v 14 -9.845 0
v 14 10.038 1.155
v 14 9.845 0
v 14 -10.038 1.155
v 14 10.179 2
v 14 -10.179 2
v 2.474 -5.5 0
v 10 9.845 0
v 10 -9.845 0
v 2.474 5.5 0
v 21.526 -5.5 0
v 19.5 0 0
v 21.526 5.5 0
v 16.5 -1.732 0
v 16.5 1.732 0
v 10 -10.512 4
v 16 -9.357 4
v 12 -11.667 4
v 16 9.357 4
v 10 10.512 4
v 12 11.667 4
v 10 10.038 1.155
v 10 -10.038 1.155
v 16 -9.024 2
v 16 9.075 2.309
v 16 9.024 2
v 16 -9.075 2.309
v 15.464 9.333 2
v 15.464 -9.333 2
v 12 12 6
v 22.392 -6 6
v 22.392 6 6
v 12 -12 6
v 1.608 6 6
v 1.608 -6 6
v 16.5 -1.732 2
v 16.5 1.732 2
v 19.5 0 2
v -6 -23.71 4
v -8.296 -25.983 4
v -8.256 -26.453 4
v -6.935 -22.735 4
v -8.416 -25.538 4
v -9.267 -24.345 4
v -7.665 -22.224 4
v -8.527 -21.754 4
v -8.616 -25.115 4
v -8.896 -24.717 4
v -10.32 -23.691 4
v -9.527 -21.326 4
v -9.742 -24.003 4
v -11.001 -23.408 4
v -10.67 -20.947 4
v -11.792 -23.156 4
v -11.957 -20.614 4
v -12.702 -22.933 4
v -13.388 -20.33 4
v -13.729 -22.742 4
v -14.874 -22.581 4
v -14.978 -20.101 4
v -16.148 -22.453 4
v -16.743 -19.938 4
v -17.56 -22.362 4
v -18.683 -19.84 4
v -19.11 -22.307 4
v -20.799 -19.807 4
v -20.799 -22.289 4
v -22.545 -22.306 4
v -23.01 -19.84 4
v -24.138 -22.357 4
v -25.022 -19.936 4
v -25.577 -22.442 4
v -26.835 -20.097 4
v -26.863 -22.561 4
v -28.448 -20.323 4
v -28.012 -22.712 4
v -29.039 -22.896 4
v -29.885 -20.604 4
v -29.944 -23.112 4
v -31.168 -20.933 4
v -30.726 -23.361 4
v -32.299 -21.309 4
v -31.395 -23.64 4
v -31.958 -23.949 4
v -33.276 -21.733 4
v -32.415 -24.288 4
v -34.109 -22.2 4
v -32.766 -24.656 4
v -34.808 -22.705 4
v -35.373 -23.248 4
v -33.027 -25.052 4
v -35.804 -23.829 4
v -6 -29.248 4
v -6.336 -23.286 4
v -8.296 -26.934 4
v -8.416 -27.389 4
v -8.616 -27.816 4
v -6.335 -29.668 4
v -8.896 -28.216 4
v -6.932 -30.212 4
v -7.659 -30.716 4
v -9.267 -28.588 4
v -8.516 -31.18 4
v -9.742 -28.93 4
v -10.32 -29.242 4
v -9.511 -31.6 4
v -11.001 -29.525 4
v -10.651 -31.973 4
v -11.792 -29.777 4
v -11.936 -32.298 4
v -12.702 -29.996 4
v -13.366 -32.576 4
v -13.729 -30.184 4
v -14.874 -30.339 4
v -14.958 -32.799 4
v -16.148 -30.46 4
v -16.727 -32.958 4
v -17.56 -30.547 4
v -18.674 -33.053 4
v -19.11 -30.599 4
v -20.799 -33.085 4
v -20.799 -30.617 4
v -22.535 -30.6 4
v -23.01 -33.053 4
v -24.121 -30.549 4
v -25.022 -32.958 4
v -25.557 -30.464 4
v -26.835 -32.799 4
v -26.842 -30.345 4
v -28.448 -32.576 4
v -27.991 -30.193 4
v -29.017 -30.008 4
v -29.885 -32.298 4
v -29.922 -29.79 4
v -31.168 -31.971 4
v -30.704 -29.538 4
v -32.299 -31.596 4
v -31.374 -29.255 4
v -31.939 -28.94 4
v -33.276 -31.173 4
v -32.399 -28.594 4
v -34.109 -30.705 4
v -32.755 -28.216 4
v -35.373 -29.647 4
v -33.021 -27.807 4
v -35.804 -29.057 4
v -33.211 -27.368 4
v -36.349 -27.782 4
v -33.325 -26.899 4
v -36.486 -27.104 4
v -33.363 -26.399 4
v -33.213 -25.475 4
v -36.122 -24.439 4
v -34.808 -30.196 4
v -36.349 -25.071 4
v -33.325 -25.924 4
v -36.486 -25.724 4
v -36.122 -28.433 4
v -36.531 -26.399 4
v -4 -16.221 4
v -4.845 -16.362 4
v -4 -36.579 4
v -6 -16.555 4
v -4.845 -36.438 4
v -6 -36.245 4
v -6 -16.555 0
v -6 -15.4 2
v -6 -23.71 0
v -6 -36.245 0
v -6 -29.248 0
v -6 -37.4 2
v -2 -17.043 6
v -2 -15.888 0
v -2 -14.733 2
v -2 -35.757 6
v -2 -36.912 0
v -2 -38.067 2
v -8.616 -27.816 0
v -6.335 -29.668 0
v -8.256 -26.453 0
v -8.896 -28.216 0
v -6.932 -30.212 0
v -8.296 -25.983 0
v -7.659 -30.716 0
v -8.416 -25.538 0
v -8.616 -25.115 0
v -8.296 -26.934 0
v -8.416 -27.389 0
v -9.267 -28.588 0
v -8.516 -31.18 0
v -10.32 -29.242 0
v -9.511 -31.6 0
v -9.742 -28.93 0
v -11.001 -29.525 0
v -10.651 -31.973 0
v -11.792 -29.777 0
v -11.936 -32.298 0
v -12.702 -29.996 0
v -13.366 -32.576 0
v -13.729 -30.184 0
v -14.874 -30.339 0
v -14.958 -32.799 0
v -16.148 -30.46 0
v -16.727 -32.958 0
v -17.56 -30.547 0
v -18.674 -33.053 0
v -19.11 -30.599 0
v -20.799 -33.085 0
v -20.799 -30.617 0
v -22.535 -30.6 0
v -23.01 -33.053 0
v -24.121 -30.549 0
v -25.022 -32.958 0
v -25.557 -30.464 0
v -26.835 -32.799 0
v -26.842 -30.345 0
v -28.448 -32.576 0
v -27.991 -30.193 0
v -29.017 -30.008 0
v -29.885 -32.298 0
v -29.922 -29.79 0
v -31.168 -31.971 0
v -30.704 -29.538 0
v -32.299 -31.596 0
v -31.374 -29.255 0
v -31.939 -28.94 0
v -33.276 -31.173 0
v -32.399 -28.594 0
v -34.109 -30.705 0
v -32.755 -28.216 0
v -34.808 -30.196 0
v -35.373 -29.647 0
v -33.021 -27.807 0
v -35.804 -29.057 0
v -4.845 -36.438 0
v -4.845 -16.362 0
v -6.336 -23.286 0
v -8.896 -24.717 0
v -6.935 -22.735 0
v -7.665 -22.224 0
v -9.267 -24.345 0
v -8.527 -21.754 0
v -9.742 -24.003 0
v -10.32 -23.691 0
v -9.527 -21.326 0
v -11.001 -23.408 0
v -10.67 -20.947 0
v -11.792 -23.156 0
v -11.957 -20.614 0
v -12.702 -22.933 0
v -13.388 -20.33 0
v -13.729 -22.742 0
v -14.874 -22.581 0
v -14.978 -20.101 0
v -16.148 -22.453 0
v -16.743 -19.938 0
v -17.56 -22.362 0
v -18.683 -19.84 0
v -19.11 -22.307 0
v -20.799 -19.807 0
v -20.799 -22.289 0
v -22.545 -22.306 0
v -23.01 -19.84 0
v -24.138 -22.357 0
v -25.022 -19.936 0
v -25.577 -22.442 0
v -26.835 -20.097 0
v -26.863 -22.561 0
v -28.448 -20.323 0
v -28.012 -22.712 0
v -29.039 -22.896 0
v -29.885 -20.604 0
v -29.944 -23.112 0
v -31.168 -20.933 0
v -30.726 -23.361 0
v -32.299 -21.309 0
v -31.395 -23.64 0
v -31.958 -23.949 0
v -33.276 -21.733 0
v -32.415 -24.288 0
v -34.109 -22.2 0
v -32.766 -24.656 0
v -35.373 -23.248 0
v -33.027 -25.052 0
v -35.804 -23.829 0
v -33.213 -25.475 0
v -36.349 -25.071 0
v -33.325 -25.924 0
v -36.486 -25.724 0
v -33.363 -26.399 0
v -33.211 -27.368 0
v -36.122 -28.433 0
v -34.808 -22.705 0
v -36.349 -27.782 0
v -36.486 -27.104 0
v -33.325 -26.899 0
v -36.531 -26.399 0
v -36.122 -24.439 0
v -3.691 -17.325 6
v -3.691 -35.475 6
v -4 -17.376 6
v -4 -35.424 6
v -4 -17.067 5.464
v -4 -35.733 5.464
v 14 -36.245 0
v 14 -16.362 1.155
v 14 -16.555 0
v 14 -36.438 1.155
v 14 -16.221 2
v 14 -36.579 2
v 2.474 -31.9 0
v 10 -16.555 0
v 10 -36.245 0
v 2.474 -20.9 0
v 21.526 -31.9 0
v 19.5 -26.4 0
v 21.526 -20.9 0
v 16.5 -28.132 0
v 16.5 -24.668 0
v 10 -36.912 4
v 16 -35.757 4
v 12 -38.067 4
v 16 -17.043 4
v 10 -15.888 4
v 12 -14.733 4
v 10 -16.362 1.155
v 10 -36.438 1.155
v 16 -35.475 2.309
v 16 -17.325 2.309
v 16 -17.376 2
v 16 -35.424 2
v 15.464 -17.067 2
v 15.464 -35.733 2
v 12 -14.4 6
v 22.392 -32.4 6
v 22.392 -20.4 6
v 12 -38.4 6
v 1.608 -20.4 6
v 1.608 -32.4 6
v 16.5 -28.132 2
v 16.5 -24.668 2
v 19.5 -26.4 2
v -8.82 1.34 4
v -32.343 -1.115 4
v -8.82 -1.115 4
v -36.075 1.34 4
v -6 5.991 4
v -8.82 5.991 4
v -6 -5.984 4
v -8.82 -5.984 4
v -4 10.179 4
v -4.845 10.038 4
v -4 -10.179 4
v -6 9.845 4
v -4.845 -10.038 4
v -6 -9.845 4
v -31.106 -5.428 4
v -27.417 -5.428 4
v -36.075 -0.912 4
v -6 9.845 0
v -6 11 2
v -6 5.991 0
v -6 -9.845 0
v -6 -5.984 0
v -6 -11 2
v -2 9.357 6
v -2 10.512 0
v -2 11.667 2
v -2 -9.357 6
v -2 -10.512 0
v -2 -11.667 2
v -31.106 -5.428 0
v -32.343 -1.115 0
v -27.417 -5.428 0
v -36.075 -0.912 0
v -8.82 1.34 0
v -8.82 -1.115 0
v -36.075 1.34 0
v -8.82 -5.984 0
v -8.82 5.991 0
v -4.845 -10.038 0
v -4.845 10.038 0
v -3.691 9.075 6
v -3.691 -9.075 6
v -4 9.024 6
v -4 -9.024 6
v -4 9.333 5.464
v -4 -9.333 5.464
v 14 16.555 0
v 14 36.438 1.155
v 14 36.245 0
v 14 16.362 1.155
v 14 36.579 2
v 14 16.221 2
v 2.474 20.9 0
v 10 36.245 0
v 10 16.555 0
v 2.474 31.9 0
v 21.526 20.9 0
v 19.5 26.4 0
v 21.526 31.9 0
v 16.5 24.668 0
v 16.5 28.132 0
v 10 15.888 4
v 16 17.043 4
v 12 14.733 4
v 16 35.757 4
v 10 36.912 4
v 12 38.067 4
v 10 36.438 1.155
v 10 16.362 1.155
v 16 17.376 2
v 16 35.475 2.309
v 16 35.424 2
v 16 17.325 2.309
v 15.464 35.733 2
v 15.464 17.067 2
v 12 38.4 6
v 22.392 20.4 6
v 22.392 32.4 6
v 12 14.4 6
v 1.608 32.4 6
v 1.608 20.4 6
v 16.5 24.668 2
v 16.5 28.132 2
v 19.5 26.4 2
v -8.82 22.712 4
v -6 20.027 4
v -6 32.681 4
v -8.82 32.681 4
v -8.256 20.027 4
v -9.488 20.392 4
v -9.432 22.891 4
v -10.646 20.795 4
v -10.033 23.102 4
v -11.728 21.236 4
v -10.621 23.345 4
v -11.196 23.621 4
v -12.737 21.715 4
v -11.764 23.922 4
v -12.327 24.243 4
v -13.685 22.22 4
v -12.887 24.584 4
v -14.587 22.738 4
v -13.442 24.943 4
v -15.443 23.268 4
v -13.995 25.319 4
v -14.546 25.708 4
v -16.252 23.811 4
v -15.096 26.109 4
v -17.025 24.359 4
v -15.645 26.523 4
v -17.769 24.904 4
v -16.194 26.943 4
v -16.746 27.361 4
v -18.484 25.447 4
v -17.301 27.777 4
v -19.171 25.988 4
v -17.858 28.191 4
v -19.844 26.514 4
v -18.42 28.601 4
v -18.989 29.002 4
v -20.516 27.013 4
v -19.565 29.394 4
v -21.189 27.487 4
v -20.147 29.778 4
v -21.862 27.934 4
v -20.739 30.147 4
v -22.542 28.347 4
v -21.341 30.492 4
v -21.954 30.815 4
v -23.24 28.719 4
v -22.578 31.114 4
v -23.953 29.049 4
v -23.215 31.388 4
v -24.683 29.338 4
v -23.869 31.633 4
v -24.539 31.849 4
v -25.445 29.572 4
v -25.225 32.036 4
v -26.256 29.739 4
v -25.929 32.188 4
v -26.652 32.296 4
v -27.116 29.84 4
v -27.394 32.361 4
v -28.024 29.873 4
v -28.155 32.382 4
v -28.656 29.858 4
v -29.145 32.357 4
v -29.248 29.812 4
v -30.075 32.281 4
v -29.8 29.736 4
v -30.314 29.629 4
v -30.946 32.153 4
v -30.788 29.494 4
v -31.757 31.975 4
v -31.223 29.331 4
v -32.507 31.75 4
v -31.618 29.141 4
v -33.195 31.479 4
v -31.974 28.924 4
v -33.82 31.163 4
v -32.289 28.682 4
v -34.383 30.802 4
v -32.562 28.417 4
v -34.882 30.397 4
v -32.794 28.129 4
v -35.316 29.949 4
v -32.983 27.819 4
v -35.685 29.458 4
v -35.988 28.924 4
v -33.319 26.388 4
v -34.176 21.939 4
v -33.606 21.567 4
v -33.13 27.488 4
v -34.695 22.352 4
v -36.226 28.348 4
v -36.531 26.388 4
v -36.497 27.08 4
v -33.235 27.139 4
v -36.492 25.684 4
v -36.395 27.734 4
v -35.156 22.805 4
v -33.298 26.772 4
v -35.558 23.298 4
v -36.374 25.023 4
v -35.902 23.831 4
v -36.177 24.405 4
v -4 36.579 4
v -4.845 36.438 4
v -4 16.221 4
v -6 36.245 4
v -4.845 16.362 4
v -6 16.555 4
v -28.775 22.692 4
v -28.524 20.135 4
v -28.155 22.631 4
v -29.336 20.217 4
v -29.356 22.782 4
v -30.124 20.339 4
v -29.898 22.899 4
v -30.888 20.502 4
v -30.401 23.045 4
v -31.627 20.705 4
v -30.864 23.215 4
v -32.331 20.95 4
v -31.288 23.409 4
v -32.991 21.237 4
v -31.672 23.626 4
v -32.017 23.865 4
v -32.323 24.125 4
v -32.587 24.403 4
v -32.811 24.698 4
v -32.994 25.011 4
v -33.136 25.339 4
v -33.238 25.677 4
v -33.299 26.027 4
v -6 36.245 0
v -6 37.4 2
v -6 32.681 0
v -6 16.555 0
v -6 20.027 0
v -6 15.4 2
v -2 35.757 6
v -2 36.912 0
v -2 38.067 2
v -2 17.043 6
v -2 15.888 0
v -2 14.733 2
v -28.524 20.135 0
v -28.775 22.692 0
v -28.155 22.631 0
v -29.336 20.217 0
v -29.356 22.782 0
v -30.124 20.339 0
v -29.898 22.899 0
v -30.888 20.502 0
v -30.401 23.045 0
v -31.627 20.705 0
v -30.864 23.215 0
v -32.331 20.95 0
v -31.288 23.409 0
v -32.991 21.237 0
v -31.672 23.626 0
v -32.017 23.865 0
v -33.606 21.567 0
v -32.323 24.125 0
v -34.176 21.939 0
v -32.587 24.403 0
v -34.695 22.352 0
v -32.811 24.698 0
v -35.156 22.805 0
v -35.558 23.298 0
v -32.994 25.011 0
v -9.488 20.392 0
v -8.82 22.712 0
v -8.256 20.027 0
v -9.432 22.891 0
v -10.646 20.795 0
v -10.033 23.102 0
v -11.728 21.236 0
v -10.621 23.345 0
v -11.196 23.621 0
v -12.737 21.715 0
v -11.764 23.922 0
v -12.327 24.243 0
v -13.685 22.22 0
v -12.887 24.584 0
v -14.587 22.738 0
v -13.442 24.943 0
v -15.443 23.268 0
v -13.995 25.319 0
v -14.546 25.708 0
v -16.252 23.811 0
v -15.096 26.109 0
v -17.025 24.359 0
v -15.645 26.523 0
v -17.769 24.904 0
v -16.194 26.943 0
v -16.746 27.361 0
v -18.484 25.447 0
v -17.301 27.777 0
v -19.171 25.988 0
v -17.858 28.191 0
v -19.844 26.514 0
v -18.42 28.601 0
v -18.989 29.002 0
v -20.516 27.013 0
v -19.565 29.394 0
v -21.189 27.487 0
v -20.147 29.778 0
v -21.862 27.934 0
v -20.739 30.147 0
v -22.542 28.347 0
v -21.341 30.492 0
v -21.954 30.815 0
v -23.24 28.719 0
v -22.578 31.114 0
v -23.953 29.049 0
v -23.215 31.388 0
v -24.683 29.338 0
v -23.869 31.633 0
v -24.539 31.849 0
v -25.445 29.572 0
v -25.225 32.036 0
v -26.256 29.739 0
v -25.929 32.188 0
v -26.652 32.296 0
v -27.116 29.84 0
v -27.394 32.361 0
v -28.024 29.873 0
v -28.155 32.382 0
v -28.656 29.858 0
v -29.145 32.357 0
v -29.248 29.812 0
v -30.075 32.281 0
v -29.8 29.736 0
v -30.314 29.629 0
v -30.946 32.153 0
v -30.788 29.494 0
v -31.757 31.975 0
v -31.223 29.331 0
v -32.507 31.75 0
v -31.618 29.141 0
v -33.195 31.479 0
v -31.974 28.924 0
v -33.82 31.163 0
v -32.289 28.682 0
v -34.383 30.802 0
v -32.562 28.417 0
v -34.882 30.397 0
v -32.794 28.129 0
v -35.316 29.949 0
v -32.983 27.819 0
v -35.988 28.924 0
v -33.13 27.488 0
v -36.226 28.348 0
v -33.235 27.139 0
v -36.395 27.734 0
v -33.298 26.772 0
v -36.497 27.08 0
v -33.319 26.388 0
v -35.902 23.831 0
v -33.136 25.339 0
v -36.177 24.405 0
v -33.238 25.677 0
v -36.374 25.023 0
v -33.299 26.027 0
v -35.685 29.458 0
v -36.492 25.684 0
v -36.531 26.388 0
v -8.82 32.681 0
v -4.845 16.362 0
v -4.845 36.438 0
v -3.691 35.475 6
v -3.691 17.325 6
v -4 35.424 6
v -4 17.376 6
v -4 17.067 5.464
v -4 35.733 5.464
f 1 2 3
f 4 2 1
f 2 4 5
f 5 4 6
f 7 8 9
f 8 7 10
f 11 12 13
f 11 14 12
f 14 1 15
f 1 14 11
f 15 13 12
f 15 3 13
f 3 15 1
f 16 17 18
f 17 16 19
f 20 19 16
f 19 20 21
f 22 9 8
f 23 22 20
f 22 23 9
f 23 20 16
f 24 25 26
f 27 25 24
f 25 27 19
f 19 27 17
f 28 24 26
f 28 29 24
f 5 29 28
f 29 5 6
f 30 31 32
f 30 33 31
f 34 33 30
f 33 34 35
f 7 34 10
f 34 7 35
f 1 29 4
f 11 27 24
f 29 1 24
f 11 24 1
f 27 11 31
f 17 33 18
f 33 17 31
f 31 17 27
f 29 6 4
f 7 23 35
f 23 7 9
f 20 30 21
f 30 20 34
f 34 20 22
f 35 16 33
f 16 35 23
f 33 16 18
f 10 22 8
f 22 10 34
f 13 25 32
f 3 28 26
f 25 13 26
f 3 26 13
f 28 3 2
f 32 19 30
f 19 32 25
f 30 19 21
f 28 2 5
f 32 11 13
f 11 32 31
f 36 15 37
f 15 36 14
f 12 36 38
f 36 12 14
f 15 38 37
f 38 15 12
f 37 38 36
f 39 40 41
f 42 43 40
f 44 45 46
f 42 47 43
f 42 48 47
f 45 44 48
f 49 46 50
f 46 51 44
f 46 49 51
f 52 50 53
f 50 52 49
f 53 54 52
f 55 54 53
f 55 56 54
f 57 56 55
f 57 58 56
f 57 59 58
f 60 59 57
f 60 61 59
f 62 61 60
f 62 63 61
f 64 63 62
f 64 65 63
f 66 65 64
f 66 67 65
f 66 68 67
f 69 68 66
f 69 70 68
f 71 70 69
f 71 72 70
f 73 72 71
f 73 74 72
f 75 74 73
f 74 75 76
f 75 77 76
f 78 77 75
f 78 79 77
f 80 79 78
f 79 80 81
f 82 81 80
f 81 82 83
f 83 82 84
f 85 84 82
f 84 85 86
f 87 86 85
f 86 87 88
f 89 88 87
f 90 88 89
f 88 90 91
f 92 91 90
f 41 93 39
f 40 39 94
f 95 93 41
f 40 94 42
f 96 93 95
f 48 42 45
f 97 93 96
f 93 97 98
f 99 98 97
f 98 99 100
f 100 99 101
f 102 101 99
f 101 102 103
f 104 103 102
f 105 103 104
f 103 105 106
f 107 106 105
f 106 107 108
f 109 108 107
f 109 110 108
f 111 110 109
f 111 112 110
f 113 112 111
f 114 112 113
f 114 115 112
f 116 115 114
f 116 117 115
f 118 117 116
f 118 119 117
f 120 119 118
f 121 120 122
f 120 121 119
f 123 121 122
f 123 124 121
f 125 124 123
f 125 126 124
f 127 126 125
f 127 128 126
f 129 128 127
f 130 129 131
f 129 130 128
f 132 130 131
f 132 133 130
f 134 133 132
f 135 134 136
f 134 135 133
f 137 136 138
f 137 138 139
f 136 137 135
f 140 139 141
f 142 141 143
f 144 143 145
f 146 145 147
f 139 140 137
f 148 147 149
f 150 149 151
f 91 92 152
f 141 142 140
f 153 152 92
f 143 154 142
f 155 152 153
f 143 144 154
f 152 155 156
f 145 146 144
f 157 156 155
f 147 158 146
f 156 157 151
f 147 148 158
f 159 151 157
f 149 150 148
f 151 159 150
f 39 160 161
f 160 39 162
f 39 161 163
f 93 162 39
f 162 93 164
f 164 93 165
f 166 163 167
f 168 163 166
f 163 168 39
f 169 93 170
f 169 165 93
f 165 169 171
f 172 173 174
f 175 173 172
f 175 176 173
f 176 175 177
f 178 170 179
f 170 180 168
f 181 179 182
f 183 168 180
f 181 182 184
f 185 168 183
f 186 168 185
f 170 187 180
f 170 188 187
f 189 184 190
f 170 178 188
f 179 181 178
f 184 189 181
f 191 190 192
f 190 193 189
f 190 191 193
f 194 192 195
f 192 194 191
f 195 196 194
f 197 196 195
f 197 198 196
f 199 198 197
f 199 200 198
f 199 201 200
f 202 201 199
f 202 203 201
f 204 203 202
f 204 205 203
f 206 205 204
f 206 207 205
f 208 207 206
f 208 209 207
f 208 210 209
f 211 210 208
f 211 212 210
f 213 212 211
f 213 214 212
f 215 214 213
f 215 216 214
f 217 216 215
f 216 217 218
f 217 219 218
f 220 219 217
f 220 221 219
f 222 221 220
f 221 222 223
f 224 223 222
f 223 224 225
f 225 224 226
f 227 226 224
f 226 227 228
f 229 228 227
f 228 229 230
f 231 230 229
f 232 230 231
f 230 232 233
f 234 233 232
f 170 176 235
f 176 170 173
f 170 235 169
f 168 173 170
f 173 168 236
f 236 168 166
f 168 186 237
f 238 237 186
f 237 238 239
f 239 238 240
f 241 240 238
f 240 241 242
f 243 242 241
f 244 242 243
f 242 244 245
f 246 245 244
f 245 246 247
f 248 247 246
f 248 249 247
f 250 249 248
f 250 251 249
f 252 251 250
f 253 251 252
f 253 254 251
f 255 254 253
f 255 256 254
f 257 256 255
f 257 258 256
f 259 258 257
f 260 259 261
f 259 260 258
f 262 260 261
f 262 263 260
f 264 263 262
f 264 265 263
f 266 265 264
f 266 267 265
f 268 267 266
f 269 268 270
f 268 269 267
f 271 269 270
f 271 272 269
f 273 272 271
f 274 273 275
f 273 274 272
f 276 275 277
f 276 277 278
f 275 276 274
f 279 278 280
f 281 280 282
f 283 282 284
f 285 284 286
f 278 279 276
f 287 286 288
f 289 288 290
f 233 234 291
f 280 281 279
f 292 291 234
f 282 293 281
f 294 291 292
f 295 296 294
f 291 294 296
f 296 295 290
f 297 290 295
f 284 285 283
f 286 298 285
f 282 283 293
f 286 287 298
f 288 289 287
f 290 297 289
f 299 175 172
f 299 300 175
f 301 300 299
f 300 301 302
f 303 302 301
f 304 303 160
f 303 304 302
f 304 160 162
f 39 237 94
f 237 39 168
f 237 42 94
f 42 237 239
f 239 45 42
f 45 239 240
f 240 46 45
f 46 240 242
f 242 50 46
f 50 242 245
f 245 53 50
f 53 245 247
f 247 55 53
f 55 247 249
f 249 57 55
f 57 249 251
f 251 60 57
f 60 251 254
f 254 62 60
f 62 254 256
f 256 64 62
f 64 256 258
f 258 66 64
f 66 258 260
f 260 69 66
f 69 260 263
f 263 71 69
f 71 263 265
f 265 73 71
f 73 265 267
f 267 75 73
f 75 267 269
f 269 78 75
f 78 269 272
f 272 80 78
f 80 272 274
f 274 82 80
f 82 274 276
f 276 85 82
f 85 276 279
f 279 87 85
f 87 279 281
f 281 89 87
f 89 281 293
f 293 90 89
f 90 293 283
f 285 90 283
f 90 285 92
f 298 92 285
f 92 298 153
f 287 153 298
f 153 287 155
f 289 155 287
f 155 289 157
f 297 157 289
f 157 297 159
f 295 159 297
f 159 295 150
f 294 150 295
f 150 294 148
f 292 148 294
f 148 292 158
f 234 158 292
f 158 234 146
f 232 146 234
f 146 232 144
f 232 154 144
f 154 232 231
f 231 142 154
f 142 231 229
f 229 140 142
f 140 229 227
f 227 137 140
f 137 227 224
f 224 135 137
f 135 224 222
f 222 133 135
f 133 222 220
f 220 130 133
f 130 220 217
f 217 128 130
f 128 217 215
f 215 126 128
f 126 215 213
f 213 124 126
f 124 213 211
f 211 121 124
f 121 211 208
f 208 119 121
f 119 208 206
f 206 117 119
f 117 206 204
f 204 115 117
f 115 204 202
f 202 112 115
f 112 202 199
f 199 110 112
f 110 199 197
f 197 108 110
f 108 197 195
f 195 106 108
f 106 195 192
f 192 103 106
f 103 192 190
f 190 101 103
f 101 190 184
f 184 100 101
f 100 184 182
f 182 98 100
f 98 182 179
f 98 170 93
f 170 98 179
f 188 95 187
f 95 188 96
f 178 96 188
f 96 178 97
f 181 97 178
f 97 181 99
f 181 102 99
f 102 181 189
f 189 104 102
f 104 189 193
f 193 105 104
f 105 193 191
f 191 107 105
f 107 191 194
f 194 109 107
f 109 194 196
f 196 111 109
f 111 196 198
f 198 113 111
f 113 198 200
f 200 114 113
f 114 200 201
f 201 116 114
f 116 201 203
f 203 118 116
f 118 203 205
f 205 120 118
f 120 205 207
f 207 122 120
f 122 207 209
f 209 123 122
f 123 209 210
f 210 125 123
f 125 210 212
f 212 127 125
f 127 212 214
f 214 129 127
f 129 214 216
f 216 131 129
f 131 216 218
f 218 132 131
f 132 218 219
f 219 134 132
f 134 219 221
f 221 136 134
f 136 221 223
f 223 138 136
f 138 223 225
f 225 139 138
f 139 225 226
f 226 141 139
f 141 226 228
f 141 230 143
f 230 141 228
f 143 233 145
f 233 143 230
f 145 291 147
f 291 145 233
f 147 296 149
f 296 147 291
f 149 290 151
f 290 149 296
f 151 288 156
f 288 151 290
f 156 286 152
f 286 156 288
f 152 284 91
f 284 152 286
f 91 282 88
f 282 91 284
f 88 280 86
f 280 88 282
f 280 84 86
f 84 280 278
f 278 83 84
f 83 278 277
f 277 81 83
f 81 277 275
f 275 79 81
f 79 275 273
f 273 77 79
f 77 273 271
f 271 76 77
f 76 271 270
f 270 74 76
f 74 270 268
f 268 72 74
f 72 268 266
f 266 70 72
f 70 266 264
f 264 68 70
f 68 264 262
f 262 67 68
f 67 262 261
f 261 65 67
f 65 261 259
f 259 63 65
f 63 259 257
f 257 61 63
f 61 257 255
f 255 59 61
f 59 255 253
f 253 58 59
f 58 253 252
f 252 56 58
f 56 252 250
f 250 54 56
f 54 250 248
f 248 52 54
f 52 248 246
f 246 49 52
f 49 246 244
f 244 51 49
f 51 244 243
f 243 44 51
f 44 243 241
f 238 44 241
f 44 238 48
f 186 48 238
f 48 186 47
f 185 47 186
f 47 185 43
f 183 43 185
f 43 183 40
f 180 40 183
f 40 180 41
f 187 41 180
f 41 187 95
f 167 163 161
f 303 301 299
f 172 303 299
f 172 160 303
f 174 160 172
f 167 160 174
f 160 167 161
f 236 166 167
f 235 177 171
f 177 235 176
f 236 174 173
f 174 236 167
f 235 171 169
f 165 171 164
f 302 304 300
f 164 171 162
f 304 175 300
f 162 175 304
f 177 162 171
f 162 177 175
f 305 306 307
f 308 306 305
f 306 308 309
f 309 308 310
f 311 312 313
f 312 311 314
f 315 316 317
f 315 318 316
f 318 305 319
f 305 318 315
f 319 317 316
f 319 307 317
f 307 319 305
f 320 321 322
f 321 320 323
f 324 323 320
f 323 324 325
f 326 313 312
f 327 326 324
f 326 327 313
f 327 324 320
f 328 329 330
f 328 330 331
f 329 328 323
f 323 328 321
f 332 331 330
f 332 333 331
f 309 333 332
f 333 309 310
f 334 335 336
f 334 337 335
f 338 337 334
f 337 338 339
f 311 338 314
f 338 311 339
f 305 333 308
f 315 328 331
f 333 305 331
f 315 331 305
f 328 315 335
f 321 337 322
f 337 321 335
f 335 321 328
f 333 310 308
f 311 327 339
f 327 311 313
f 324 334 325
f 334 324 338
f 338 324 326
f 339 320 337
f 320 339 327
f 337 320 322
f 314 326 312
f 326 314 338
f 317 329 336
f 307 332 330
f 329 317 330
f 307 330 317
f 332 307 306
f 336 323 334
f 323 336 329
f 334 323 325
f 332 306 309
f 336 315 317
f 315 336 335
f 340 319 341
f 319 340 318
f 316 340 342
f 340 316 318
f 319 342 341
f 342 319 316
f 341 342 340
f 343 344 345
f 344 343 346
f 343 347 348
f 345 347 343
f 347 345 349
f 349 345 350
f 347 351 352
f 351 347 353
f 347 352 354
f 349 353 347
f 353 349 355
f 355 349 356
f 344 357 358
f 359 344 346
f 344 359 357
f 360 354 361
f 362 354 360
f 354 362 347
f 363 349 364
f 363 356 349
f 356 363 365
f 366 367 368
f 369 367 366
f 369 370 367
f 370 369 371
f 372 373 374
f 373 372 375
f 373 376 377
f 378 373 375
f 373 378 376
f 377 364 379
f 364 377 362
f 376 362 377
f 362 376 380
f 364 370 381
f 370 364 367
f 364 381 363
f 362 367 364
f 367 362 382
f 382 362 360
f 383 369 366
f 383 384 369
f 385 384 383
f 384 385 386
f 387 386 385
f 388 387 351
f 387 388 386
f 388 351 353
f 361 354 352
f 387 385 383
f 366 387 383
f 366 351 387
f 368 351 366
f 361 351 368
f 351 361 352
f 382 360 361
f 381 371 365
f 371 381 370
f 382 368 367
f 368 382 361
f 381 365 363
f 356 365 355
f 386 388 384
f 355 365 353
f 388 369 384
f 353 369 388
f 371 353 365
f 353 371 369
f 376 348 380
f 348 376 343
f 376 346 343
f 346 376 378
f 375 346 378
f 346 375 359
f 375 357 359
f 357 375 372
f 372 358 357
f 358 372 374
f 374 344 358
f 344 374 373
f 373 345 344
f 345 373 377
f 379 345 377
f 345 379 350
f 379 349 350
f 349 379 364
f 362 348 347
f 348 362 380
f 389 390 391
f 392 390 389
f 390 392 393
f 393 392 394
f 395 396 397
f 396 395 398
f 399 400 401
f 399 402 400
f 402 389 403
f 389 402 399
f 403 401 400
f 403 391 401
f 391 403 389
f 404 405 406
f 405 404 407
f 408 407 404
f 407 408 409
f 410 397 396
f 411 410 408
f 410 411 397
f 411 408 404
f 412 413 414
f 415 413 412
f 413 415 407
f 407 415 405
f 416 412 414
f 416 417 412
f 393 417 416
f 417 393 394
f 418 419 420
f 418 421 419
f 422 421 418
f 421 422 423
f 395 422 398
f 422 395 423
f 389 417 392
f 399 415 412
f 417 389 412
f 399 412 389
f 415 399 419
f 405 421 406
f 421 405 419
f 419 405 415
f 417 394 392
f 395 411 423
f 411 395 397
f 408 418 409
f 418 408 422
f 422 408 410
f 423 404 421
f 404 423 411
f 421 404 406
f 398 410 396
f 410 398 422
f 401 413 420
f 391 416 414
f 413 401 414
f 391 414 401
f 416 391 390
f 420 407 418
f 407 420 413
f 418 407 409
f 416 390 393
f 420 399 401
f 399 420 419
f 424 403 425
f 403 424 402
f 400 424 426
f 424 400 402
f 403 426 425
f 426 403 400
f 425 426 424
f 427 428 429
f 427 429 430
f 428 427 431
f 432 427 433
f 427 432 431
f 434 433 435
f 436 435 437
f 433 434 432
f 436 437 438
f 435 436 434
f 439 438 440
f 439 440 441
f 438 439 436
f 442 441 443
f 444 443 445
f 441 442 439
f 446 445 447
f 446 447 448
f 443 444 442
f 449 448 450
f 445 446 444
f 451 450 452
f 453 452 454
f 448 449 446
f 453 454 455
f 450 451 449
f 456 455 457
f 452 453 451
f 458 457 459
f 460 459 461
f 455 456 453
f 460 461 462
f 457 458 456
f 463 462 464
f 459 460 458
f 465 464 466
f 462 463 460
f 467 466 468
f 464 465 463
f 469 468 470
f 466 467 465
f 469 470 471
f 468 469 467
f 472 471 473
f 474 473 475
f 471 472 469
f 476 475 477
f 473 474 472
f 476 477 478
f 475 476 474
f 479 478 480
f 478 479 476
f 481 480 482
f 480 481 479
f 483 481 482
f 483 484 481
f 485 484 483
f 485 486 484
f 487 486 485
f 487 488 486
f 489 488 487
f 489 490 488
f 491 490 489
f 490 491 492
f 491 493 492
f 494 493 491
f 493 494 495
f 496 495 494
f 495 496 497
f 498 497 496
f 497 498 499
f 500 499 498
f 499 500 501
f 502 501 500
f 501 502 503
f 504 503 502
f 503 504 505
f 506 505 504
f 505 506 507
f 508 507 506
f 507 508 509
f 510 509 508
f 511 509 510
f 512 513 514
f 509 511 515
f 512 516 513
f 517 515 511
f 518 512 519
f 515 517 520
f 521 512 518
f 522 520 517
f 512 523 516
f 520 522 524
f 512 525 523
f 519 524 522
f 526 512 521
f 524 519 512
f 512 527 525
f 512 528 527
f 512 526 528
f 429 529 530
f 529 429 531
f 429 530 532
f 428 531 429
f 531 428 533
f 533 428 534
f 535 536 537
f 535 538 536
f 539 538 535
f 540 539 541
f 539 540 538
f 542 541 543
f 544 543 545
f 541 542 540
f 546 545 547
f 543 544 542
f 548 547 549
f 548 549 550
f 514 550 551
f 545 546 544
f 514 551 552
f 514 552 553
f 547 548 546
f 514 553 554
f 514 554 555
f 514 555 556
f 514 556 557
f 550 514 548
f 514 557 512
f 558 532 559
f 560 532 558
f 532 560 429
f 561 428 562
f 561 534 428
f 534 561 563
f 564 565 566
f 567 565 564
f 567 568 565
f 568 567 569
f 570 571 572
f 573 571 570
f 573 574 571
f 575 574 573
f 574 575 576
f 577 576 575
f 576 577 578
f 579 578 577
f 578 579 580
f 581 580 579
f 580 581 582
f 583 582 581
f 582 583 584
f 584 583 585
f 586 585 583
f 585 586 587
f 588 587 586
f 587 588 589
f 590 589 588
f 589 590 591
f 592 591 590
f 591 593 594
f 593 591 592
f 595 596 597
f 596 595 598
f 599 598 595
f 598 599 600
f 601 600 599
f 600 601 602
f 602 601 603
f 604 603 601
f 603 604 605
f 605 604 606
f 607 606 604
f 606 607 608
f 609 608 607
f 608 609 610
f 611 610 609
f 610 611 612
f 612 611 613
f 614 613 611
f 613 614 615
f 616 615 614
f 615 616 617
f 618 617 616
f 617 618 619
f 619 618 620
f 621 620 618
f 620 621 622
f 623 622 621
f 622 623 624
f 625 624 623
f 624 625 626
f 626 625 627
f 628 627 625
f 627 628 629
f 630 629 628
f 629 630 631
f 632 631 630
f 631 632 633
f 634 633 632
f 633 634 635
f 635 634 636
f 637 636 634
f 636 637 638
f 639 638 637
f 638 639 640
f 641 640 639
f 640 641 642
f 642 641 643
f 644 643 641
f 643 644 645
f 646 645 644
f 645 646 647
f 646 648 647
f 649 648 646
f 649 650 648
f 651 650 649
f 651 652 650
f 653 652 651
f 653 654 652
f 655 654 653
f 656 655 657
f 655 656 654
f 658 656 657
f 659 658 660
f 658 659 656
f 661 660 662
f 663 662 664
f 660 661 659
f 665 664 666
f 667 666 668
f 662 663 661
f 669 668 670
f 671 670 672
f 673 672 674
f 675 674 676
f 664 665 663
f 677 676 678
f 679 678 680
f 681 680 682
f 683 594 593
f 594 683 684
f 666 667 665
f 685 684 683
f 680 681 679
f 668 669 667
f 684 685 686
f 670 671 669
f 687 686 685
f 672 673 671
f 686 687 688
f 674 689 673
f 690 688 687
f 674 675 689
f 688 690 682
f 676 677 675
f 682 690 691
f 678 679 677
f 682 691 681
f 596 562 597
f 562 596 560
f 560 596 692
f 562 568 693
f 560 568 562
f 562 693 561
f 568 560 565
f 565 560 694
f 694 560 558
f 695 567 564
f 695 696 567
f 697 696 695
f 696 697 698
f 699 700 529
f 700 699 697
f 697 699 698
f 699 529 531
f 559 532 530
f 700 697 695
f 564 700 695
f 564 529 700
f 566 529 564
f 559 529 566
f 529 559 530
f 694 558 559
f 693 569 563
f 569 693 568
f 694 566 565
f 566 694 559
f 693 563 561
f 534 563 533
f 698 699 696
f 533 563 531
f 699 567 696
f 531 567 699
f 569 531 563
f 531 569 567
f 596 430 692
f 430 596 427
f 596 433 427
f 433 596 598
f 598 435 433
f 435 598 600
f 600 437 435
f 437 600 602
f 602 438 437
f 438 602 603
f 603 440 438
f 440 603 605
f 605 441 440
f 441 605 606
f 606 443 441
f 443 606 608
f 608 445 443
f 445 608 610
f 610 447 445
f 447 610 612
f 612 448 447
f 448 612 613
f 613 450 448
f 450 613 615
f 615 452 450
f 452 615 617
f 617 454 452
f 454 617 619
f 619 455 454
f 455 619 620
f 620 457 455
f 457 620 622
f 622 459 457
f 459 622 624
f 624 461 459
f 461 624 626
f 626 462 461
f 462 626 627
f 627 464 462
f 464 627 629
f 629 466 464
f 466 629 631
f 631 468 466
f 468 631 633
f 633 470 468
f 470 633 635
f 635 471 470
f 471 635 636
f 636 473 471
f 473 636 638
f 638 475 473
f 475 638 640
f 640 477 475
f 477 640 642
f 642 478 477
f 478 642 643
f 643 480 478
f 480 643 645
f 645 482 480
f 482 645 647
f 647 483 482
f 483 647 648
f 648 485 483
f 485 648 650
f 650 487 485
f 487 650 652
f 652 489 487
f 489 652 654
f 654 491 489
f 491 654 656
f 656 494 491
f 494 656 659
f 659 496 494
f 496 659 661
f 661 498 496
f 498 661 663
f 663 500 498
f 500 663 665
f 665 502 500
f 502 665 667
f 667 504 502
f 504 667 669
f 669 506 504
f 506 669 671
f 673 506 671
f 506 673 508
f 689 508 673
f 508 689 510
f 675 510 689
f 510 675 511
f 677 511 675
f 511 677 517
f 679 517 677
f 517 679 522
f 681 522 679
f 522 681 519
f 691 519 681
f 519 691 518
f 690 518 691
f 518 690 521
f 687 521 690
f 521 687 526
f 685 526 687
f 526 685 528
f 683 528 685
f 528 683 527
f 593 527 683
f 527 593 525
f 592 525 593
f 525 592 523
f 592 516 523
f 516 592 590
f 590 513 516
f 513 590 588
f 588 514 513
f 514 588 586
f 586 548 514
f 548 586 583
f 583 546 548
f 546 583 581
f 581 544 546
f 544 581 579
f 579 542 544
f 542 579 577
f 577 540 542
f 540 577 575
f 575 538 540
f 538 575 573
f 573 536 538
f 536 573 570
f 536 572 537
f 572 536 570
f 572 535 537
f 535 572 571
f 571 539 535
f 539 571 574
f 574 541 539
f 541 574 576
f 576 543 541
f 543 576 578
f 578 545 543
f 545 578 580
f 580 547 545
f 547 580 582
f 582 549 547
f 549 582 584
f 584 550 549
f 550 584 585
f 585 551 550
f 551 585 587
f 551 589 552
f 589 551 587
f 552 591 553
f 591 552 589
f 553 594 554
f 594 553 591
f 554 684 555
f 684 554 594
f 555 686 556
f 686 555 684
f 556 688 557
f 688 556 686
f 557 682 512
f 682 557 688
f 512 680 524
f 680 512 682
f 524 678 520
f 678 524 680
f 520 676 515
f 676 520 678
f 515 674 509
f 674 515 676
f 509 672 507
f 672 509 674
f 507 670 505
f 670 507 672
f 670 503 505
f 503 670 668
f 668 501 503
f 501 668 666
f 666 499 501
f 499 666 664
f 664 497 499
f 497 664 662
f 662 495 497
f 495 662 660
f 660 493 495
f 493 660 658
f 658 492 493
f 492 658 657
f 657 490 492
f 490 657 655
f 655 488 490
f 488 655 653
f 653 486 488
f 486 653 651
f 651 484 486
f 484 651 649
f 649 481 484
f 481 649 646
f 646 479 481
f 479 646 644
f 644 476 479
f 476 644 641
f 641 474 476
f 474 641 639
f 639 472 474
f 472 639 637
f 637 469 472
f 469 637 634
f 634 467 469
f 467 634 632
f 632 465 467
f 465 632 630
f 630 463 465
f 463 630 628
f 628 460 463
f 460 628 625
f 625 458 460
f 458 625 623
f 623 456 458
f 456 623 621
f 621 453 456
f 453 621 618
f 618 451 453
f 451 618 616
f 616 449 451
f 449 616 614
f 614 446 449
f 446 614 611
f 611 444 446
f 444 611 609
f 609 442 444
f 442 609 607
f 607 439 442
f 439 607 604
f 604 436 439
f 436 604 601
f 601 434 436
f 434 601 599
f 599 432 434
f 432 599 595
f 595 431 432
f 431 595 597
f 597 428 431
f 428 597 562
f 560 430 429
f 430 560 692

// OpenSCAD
//Constants
sml_BaseCircle = 90;
sml_BaseTriangle = 3;
sml_BaseSquare = 4;
sml_BasePentagon = 5;
sml_BaseHexagon = 6;

//Functions
function getRadiusForTriangle(w) = (w*.577)-.5; //Slightly less than w
function getRadiusForSquare(w) = ((w*1.41)-1)/2;  //Slightly less than w

//Modules
module sml_Base (bsc, bw, bto, bh) {
    difference () {
        //Base
        {
            if (bsc == sml_BaseCircle) {
                rotate([0,0,0])
                    cylinder(h=bh, r1=bw/2, r2=(bw/2)-bto, $fn=bsc);
            }
            else if (bsc == sml_BaseTriangle) {
                rotate([0,0,0])
                    cylinder(h=bh, r1=getRadiusForTriangle(bw), r2=getRadiusForTriangle(bw)-bto, $fn=bsc);
            }
            else if (bsc == sml_BaseSquare) {
                rotate([0,0,45])
                    cylinder(h=bh, r1=getRadiusForSquare(bw), r2=getRadiusForSquare(bw)-bto, $fn=bsc);
            }
            else if (bsc == sml_BasePentagon) {
                rotate([0,0,0])
                    cylinder(h=bh, r1=bw/2, r2=(bw/2)-bto, $fn=bsc);
            }
            else if (bsc == sml_BaseHexagon) {
                rotate([0,0,30])
                    cylinder(h=bh, r1=bw/2, r2=(bw/2)-bto, $fn=bsc);
            }
            else {
                rotate([0,0,0])
                    cylinder(h=bh, r1=bw/2, r2=(bw/2)-bto, $fn=bsc);
            }
        }
        //Facing Indicator
        translate([((bw/2)-bto)*.5,0,bh-2])
            cylinder(h=4, r=2, $fn=3);
    }
}

module sml_BaseInverse (bsc, bw, bto, bh, coh, cot) {
    difference () {
        translate([-(bw+4)/2,-(bw+4)/2,0])
            cube([bw+4,bw+4,bh]);
            sml_Base(bsc, bw, bto, bh);
    }
}

module sml_Cutout (bw, bh, coh, cot) {
    //Cutout
    translate([-cot/2,-(bw+4)/2,bh-(coh)])
        union () {
            cube([cot,bw+4,coh]);
            translate([cot,0,0])
                cube([cot/2,bw+4,cot/2]);
        }
}

module sml_Text(tc, tt, ths, tws, to, bh) {
    translate([-tt/2,-to,bh-.5])
        rotate([90,0,90])
            scale([tws,ths,1])
                linear_extrude (height=tt)
                    text(tc);
} 

module sml_BaseFinal (bsc, bw, bto, bh, coh, cot) {
    difference() {
        sml_Base(bsc, bw, bto, bh);
        sml_Cutout(bw, bh, coh, cot);
    }
}

module sml_TextFinal (bsc, bw, bto, bh, coh, cot, tc, tt, ths, tws, to) {
            difference () {
                    union () {
                        sml_Text(tc, tt, ths, tws, to, bh);        
                        sml_Cutout(bw, bh, coh, cot);
                    }
                    difference () {
                        sml_BaseInverse (bsc, bw, bto, bh, coh, cot);
                        sml_BaseFinal (bsc, bw, bto, bh, coh, cot);
                    }
                }
}

module sml_Mini (bsc, bw, bto, bh, coh, cot, tc, tt, ths, tws, to) {
    translate([0,0,tt/2])
        rotate([0,-90,0])    
            sml_TextFinal(bsc, bw, bto, bh, coh, cot, tc, tt, ths, tws, to);
    translate([0,0,bh])
        rotate([180,0,0])
            translate([bw/2,0,0])
                sml_BaseFinal(bsc, bw, bto, bh, coh, cot);
}

sml_BaseSideCount = 6;
sml_BaseWidth = 24;
sml_BaseTopOffset = 1;
sml_BaseHeight = 6;

sml_TextThickness = 4;
sml_TextHeightScale = 3.2;
sml_TextWidthScale = 2;
sml_TextCharacter = "0";

sml_CutoutHeight = 4;
sml_CutoutThickness = sml_TextThickness;

sml_Text_Offset_Digit = 7.77;
sml_Text_Offset_1 = 8.1;

translate([0,-sml_BaseWidth*1.1,0])
sml_Mini(sml_BaseSideCount, sml_BaseWidth, sml_BaseTopOffset, sml_BaseHeight, sml_CutoutHeight, sml_CutoutThickness, sml_TextCharacter, sml_TextThickness, sml_TextHeightScale, sml_TextWidthScale, sml_Text_Offset_Digit);

sml_Mini(sml_BaseSideCount, sml_BaseWidth, sml_BaseTopOffset, sml_BaseHeight, sml_CutoutHeight, sml_CutoutThickness, "1", sml_TextThickness, sml_TextHeightScale, sml_TextWidthScale, sml_Text_Offset_1);

translate([0,sml_BaseWidth*1.1,0])
sml_Mini(sml_BaseSideCount, sml_BaseWidth, sml_BaseTopOffset, sml_BaseHeight, sml_CutoutHeight, sml_CutoutThickness, "2", sml_TextThickness, sml_TextHeightScale, sml_TextWidthScale, sml_Text_Offset_Digit);
